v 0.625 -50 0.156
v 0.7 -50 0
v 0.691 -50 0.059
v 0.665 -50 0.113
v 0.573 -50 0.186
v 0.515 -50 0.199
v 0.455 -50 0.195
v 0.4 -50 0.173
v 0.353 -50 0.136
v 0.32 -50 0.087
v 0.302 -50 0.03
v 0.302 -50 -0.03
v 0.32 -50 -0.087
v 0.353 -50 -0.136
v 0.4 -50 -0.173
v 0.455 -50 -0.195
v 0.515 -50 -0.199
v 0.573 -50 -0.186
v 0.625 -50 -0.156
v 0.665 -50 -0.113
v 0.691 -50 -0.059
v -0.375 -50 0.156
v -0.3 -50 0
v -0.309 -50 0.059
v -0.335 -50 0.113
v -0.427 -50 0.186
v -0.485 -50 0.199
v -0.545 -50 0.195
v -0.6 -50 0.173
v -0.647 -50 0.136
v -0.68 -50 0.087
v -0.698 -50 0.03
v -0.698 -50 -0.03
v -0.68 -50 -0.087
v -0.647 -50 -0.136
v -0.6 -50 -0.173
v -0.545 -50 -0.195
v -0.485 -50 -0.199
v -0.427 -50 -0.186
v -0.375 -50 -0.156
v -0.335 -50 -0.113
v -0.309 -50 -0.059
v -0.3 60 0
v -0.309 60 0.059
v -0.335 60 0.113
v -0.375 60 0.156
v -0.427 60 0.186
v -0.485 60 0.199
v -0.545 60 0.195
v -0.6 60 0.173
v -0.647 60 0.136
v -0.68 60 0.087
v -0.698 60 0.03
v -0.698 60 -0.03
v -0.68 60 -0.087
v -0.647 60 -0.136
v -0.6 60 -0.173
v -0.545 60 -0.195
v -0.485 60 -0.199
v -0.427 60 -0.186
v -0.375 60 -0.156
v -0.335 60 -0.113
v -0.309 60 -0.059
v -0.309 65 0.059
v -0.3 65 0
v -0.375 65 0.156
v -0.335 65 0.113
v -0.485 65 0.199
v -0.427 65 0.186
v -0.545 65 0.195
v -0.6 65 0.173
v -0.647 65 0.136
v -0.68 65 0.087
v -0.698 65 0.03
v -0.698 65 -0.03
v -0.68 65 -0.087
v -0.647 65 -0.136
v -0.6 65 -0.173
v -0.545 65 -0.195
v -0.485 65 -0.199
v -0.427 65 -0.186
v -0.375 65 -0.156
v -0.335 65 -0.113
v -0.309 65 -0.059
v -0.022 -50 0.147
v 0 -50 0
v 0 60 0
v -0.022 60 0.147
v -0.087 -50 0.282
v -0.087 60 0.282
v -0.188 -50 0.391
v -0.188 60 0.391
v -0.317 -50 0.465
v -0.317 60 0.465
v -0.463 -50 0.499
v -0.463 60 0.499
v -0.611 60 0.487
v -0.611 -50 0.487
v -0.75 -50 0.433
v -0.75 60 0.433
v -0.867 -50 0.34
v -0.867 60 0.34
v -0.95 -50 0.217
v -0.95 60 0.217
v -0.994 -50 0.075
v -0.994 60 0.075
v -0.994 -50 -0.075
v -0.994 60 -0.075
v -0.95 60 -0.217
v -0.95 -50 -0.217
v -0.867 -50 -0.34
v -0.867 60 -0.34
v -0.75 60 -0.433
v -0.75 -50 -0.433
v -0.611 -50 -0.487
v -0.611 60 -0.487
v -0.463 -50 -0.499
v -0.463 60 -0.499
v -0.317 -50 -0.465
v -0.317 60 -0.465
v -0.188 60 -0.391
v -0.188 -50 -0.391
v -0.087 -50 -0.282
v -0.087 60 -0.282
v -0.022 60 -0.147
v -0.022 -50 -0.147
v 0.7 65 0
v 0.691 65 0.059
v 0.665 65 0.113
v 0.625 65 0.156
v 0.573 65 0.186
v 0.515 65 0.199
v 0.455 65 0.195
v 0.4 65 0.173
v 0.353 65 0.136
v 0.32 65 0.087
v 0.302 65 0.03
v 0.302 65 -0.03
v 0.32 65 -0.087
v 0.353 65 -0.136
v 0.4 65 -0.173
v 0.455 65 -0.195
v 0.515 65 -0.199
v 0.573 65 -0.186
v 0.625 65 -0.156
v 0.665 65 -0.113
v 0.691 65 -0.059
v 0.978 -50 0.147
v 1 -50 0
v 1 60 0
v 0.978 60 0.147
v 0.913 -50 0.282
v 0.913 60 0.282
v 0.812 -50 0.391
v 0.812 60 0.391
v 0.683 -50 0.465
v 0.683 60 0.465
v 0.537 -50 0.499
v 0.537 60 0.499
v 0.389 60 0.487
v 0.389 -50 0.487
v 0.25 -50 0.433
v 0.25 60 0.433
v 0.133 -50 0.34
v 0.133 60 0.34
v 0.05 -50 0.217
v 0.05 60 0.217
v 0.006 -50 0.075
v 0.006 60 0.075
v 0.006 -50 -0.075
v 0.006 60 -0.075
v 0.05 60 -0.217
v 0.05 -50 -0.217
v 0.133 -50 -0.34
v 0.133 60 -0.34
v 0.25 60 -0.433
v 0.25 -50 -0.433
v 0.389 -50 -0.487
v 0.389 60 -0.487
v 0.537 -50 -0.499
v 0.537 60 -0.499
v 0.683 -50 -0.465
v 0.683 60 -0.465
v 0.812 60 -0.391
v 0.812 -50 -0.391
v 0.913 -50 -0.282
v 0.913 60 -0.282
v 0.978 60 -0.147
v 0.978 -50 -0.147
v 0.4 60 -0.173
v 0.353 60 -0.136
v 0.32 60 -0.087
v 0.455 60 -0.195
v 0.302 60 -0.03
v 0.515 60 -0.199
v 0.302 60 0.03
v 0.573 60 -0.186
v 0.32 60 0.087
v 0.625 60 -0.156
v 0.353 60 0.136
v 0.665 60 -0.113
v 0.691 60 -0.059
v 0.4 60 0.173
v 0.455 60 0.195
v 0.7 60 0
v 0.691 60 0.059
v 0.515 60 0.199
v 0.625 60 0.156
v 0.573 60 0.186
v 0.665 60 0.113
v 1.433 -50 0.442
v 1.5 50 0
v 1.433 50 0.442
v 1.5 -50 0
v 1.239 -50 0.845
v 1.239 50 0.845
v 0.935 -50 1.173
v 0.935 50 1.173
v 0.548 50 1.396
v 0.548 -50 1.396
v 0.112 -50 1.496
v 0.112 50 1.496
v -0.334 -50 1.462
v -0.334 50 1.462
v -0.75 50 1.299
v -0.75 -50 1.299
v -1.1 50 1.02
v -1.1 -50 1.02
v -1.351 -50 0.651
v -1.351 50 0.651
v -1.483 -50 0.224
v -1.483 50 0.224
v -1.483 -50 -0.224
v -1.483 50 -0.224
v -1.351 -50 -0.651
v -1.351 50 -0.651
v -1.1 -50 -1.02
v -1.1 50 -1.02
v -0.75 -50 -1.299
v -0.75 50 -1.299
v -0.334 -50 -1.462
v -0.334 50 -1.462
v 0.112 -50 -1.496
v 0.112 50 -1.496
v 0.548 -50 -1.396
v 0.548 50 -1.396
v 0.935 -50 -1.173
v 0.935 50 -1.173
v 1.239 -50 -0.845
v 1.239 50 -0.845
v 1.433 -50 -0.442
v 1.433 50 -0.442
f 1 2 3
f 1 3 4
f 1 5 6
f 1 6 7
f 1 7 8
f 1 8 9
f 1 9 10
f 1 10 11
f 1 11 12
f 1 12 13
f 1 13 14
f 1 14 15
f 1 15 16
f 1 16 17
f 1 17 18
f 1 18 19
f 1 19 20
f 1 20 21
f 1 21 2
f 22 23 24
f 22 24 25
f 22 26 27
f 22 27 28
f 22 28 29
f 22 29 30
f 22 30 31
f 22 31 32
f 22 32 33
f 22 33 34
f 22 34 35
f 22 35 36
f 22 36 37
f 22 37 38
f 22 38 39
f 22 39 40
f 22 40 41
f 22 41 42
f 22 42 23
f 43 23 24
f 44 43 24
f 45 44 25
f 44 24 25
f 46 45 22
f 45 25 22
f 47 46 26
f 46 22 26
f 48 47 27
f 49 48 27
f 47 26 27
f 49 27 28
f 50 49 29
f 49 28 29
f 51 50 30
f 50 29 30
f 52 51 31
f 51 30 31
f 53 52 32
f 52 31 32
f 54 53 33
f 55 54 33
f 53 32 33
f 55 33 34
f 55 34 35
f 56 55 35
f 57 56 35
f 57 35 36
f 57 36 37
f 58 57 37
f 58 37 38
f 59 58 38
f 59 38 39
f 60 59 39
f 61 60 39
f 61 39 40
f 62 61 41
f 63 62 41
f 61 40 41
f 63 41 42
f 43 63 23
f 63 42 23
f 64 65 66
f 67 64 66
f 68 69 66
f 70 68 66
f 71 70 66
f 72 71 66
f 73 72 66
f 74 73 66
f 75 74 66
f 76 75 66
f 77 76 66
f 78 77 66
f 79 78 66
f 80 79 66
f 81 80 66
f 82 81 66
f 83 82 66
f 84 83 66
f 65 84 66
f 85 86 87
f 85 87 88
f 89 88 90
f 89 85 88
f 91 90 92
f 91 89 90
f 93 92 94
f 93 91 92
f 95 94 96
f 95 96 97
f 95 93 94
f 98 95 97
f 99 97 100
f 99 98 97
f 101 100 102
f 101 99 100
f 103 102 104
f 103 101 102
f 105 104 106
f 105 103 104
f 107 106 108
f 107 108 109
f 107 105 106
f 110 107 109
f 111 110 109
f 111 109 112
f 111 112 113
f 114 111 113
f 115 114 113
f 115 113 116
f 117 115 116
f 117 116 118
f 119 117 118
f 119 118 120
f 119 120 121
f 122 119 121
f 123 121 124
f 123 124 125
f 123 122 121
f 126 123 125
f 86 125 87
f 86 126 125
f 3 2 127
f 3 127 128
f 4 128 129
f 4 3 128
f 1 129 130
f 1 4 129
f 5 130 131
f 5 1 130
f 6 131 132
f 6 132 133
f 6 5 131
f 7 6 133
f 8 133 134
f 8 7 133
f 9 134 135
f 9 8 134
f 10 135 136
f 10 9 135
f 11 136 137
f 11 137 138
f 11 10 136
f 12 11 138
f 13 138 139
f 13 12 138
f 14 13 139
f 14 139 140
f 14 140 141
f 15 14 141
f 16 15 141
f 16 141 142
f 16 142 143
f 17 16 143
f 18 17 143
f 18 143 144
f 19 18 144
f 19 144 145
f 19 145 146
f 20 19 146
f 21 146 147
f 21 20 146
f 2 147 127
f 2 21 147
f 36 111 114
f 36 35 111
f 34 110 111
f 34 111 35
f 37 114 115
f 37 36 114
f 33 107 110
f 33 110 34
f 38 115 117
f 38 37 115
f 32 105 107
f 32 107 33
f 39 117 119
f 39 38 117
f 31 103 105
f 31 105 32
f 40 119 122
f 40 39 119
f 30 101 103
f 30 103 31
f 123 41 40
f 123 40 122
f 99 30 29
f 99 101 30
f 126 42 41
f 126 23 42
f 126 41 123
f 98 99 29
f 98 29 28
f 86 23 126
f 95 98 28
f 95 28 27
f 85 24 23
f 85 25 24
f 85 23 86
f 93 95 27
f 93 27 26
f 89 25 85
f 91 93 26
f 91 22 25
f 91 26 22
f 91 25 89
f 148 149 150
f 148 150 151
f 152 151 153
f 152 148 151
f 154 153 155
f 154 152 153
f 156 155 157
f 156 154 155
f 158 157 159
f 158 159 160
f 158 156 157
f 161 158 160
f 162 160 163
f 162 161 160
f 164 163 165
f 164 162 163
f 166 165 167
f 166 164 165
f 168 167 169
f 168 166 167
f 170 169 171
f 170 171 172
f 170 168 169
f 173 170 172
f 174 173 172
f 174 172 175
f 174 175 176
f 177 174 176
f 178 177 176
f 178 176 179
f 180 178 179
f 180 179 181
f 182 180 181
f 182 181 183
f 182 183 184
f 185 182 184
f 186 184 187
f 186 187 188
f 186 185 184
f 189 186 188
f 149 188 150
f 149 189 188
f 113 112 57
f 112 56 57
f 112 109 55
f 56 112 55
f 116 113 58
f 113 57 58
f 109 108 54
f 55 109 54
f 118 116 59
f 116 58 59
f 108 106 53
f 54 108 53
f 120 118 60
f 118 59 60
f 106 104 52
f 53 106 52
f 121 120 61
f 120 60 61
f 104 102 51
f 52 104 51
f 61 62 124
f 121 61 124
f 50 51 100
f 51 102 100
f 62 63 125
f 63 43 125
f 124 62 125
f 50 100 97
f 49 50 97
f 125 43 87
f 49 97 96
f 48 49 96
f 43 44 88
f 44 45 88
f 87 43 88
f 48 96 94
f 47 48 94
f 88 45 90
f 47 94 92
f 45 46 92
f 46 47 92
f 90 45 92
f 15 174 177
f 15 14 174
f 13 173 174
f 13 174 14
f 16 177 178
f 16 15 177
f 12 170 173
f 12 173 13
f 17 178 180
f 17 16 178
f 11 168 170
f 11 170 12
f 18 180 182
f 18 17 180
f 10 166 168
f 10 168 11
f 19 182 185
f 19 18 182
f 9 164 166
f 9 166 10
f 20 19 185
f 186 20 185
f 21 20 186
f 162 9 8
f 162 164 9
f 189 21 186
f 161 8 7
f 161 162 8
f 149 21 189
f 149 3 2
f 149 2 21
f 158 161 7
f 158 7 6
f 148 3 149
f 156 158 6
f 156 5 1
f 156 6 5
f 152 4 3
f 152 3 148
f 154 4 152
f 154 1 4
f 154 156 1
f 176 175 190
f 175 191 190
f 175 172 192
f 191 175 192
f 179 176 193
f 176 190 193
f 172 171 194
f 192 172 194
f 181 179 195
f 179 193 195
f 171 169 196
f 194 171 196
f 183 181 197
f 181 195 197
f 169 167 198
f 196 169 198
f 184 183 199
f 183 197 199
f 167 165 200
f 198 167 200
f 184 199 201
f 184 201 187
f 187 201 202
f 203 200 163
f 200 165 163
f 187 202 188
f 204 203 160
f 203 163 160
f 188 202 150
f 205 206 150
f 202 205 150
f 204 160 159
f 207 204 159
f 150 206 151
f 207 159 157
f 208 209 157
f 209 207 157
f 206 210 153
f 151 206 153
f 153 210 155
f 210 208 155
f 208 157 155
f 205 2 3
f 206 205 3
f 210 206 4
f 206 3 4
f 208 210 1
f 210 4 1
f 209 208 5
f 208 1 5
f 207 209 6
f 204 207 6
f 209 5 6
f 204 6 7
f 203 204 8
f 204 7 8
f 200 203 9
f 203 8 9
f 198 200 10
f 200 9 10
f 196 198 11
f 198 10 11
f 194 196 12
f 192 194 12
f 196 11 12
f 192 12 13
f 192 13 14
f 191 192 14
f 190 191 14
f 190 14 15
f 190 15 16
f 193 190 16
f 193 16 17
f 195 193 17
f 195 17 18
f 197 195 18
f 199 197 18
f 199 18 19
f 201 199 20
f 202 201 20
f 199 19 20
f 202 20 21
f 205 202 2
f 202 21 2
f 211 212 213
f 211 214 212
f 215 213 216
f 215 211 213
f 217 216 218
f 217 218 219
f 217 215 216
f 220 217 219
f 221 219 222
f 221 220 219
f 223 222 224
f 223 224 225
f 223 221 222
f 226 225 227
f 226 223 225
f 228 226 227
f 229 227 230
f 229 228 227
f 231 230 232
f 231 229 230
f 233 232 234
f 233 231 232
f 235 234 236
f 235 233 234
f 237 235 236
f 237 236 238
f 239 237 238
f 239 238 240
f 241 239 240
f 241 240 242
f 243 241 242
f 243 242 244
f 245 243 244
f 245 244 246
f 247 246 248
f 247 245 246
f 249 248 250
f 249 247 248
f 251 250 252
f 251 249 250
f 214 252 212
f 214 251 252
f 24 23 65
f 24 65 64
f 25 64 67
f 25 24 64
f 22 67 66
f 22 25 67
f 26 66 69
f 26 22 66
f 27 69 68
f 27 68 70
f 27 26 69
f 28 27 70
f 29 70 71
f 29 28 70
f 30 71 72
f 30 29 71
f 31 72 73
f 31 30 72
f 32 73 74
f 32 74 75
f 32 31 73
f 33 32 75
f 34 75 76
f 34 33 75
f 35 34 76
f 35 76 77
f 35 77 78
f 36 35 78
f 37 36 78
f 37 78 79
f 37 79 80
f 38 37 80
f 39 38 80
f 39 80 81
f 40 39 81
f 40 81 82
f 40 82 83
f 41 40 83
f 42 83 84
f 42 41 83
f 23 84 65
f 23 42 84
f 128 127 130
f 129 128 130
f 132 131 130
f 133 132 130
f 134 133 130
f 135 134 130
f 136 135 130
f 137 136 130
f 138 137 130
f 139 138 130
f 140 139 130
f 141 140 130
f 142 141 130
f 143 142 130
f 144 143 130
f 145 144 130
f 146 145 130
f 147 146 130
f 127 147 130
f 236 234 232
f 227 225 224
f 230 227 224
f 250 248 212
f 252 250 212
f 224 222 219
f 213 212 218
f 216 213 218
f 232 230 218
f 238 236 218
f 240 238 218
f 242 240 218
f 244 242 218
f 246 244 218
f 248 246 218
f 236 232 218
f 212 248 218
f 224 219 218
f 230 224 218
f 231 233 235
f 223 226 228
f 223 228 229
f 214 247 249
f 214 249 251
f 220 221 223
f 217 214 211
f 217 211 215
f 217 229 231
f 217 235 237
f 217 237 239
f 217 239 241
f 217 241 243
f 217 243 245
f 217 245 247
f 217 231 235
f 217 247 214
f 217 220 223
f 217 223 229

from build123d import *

# Parameters (mm, degrees)
F0_R     = 1.5
F1_DEPTH = 50
F2_R     = 0.2
F3_DEPTH = 110
F2_R_2   = 0.5
F4_DEPTH = 110
F5_DEPTH = 115


with BuildPart() as f1:
    # F0 (on Front) → F1 (new body, symmetric)
    with BuildSketch(Plane.XZ):
        Circle(F0_R)
    extrude(amount=F1_DEPTH, both=True)


with BuildPart() as f3:
    # F2 (on face) → F3 (new body)
    with BuildSketch(Plane.XZ.offset(50)):
        with BuildLine():
            ThreePointArc((0, 0), (0.5, -0.5), (1, 0))
            ThreePointArc((1, 0), (0.5, 0.5), (0, 0))
        make_face()
        with Locations((0.5, 0)):
            Circle(F2_R, mode=Mode.SUBTRACT)
    extrude(amount=-F3_DEPTH)


with BuildPart() as f4:
    # F2 (on face) → F4 (new body)
    with BuildSketch(Plane.XZ.offset(50)):
        with Locations((-0.5, 0)):
            Circle(F2_R_2)
        with Locations((-0.5, 0)):
            Circle(F2_R, mode=Mode.SUBTRACT)
    extrude(amount=-F4_DEPTH)


with BuildPart() as f5:
    # F2 (on face) → F5 (new body)
    with BuildSketch(Plane.XZ.offset(50)):
        with Locations((-0.5, 0)):
            Circle(F2_R)
    extrude(amount=-F5_DEPTH)


with BuildPart() as f5b:
    # F2 (on face) → F5, piece 2 (new body)
    with BuildSketch(Plane.XZ.offset(50)):
        with Locations((0.5, 0)):
            Circle(F2_R)
    extrude(amount=-F5_DEPTH)


solid = Compound([f1.part, f3.part, f4.part, f5.part, f5b.part])
